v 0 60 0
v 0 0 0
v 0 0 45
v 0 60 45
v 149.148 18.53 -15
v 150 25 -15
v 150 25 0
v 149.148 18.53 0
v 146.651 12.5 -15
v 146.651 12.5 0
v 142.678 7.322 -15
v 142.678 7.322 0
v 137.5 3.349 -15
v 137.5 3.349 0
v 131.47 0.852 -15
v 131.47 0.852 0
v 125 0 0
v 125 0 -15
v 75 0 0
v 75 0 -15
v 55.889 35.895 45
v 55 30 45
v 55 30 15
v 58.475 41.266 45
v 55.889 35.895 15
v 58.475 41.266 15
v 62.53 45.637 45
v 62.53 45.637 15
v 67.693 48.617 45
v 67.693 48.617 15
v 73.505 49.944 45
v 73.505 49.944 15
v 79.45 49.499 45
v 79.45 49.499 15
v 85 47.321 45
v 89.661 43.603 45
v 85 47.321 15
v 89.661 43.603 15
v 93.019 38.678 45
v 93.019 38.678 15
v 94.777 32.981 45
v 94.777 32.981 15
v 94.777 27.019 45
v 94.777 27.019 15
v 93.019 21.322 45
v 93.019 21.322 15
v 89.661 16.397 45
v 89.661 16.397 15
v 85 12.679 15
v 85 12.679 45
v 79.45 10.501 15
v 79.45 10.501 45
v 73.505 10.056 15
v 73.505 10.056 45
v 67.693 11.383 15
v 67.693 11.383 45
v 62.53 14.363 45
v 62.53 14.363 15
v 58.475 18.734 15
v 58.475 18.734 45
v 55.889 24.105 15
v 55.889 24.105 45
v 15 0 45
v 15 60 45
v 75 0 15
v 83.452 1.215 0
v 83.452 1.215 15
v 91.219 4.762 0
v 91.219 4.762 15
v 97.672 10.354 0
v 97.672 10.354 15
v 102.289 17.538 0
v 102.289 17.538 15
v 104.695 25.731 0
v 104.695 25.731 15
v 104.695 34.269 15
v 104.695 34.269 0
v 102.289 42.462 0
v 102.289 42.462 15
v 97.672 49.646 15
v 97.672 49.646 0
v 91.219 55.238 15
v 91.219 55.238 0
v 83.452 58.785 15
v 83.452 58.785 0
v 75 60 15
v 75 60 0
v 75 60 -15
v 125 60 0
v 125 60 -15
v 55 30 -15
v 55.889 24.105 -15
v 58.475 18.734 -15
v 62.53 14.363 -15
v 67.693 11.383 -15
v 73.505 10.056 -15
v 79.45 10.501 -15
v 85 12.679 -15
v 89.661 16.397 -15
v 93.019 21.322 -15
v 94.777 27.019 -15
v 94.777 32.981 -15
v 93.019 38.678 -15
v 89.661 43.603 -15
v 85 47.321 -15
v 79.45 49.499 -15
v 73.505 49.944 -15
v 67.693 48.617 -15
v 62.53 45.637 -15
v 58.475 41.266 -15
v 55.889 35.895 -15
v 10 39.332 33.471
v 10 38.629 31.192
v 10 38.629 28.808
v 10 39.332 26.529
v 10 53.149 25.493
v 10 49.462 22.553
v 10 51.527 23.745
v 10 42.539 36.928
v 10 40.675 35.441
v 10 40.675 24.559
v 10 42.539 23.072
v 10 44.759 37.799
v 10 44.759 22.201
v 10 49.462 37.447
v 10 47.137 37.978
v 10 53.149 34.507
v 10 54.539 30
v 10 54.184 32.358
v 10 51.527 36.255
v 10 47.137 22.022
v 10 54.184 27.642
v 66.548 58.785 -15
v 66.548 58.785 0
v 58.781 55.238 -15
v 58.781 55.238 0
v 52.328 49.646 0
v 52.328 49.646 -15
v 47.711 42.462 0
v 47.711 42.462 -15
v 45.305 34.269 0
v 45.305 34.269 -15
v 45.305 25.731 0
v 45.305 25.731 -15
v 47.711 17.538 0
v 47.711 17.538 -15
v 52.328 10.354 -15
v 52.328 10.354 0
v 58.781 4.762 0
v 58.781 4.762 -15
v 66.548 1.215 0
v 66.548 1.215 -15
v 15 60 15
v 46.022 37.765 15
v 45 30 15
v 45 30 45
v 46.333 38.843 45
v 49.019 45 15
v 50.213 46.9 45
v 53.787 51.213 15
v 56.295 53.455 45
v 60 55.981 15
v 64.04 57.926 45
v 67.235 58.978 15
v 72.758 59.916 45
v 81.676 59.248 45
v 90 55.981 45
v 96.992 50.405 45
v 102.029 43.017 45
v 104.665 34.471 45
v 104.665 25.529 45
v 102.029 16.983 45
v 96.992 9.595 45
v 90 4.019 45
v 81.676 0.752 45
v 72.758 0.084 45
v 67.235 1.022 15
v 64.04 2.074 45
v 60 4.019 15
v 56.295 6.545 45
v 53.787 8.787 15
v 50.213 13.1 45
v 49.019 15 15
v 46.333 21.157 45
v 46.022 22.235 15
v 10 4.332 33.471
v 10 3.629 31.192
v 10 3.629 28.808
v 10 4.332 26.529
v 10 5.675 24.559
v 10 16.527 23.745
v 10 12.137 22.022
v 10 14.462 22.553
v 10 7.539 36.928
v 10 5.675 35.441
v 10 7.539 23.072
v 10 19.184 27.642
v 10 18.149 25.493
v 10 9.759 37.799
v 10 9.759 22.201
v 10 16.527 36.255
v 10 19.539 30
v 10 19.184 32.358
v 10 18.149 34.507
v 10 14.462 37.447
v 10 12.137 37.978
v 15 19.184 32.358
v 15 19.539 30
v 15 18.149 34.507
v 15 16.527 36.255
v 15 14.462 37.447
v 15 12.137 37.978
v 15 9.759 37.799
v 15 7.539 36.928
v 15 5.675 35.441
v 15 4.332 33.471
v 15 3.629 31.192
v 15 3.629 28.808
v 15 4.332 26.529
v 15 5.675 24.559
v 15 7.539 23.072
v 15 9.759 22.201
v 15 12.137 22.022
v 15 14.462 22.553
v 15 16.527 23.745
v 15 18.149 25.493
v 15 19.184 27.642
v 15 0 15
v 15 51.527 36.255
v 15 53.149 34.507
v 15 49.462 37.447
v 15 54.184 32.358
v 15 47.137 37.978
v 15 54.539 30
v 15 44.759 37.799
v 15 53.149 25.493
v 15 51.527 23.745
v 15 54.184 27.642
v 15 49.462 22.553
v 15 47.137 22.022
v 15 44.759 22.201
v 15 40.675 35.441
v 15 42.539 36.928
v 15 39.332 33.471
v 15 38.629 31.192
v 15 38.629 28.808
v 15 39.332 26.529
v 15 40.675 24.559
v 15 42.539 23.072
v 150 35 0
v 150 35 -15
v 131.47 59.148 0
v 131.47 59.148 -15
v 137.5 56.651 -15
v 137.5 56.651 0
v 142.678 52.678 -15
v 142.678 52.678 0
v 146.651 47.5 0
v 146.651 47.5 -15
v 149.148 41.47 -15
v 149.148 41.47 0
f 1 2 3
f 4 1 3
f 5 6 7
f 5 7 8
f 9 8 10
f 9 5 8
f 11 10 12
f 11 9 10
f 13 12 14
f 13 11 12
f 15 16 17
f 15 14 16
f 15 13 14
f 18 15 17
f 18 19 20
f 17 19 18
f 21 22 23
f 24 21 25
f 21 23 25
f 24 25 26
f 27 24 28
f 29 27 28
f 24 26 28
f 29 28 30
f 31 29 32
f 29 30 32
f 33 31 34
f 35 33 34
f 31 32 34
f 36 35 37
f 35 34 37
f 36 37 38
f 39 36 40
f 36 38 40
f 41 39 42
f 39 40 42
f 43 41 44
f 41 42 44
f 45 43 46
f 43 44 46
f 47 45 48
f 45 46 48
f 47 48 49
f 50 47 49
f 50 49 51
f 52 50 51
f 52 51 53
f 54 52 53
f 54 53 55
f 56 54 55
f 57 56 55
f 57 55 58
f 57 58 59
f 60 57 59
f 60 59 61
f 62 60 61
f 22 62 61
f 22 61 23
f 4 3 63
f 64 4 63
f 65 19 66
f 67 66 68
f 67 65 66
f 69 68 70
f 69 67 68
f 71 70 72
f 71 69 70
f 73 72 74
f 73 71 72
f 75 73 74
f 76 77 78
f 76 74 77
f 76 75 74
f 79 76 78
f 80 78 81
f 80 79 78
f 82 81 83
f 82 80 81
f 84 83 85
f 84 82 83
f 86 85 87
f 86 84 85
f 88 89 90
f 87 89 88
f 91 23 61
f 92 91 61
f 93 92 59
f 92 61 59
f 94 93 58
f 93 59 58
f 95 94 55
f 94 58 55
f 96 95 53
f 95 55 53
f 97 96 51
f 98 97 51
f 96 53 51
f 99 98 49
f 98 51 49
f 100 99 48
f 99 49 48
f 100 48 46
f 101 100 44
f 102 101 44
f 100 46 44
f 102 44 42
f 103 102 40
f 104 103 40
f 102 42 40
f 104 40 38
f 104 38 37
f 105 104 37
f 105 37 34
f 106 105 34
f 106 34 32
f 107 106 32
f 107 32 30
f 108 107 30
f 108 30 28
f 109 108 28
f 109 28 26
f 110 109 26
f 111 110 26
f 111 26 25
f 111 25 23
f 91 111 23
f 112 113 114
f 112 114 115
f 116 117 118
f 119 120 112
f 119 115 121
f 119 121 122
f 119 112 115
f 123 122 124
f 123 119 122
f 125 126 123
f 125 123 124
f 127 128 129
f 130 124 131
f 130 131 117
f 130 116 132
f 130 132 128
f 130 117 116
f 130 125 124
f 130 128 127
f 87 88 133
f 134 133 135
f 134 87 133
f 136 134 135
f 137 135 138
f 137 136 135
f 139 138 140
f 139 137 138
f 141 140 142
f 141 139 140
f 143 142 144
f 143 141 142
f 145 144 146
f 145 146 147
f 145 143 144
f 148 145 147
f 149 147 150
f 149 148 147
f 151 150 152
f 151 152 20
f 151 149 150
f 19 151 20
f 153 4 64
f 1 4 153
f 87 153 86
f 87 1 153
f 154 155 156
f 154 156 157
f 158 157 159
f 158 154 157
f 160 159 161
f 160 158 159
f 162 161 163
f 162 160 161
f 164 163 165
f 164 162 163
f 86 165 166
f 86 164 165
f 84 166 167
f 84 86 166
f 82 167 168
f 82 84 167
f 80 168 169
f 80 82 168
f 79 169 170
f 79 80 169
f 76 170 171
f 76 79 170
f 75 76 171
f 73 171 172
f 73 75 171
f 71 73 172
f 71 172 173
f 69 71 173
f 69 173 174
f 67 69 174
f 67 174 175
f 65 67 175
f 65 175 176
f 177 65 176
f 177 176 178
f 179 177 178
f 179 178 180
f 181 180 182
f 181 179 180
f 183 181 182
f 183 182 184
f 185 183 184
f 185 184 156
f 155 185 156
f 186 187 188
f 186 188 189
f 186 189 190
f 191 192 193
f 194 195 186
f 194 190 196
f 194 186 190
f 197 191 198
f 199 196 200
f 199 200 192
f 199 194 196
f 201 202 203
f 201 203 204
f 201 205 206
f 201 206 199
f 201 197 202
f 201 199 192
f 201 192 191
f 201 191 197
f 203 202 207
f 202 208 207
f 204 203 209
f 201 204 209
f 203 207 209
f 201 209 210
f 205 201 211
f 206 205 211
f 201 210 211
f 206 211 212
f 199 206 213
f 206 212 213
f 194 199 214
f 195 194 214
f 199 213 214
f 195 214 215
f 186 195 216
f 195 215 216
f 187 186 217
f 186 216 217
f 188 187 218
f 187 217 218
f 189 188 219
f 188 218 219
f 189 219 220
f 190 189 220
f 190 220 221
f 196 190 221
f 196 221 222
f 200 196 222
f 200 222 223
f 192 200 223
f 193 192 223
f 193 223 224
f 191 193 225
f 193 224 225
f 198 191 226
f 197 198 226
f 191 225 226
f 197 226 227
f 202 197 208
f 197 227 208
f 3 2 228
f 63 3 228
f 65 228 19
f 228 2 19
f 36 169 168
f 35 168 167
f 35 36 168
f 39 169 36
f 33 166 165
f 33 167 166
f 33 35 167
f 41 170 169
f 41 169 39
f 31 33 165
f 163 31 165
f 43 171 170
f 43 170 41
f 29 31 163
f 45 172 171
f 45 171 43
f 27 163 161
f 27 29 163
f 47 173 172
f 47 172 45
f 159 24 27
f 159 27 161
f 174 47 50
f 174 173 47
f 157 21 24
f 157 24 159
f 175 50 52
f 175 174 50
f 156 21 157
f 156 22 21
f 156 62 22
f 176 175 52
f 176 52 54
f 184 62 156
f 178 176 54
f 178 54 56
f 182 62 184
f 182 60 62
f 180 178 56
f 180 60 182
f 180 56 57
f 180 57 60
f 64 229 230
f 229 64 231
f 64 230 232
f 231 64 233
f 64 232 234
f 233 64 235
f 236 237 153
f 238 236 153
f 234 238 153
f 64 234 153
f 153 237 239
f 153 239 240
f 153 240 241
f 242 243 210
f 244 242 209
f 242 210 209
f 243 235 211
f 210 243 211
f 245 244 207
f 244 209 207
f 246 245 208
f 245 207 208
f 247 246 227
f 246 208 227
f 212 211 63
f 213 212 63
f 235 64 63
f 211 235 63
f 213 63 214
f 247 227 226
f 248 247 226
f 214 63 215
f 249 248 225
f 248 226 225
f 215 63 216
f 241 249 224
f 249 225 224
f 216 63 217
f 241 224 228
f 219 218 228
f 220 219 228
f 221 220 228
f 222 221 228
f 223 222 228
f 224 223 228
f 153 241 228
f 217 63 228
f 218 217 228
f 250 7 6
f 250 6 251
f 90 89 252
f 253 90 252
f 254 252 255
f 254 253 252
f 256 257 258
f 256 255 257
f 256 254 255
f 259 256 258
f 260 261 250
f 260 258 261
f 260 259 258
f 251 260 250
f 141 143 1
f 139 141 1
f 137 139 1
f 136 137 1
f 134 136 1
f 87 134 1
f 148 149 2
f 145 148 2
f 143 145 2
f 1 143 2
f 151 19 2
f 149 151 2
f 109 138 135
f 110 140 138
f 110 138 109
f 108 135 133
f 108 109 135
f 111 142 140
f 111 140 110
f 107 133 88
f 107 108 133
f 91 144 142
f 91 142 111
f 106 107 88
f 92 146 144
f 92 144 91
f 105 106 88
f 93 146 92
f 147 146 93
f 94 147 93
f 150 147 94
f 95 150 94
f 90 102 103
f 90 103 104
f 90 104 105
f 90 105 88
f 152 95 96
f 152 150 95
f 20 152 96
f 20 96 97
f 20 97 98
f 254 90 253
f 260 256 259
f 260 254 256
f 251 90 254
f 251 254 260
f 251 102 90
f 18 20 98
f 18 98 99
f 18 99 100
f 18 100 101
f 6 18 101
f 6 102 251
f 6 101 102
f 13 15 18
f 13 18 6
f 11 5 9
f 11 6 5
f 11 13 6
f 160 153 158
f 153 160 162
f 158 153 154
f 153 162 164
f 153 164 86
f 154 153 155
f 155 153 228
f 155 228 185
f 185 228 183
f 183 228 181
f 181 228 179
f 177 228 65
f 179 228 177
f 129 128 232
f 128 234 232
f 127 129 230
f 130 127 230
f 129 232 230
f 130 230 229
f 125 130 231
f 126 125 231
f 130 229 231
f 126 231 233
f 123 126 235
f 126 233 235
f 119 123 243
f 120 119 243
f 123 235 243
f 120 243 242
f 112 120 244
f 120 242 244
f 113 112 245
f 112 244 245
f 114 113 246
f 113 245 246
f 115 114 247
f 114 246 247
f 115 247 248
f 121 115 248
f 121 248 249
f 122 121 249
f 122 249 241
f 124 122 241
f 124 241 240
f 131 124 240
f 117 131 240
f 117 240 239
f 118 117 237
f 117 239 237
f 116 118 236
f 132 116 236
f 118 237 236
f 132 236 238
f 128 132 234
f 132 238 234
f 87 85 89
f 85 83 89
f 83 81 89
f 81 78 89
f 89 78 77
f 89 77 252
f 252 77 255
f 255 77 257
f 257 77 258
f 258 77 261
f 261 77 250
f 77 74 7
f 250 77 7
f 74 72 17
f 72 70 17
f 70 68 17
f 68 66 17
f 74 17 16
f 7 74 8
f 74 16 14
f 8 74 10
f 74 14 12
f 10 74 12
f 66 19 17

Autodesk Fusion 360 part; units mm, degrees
sketch "Sketch1" plane through (0, 0, 0) normal (0, 1, 0) x (1, 0, 0)
  line L0 (0, 0) -> (0, -45)
  line L1 (0, -45) -> (15, -45)
  line L2 (15, -45) -> (15, -15)
  line L3 (15, -15) -> (75, -15)
  line L4 (75, -15) -> (75, 0)
  line L5 (75, 0) -> (0, 0)
  dimension "d1" = 45
  dimension "d2" = 15
  dimension "d3" = 30
  dimension "d4" = 60
extrude "Extrude1" add sketch "Sketch1" along normal blind 60
sketch "Sketch2" plane through (15, 0, 0) normal (1, 0, 0) x (0, 1, 0)
  line L0 (0, 45) -> (0, 15)
  line L1 (0, 15) -> (60, 15)
  line L2 (60, 15) -> (60, 45)
  line L3 (60, 45) -> (0, 45)
  circle A0 centre (11.5393, 30) radius 8
  circle A1 centre (46.5393, 30) radius 8
  dimension "d7" = 15
  dimension "d8" = 15
  dimension "d9" = 35
  dimension "d10" = 16
  dimension "d11" = 16
extrude "Extrude2" cut sketch "Sketch2" against normal blind 5 contours A0 | A1
sketch "Sketch3" plane through (0, 0, 15) normal (0, 0, 1) x (-1, 0, 0)
  line L0 (-15, 0) -> (-75, 0)
  line L1 (-75, 0) -> (-75, -60)
  line L2 (-75, -60) -> (-15, -60)
  line L3 (-15, -60) -> (-15, 0)
  line L4 (0, 0) -> (0, -30) construction
  line L5 (0, -30) -> (-75, -30) construction
  circle A0 centre (-75, -30) radius 30
  circle A1 centre (-75, -30) radius 20
  dimension "d14" = 30
  dimension "d15" = 75
  dimension "d16" = 60
  dimension "d17" = 40
extrude "Extrude4" cut sketch "Sketch3" against normal blind 60 contours L1 A0 A1 | L1 A0 A1 | L1 A1 | L1 A1
extrude "Extrude5" add sketch "Sketch3" along normal blind 0 and the other way blind 15 contours L1 A0 A1 | L1 A0 A1
extrude "Extrude6" add sketch "Sketch3" against normal blind 15 from surface at -15 contours L1 A0 A1 | L1 A0 A1
extrude "Extrude7" add sketch "Sketch3" along normal blind 30 contours L1 A0 A1 | L1 A0 A1
sketch "Sketch4" plane through (0, 0, 0) normal (0, -1, 0) x (1, 0, 0)
  line L0 (0, 0) -> (75, 0)
  line L1 (75, 0) -> (75, 15)
  line L2 (75, 15) -> (15, 15)
  line L3 (15, 15) -> (15, 45)
  line L4 (15, 45) -> (0, 45)
  line L5 (0, 45) -> (0, 0)
sketch "Sketch5" plane through (0, 0, 45) normal (0, 0, 1) x (-1, 0, 0)
  circle A0 centre (-75, -30) radius 20
  circle A1 centre (-75, -30) radius 30
sketch "Sketch6" plane through (0, 0, 0) normal (-1, 0, 0) x (0, -1, 0)
  line L0 (0, 0) -> (0, 45)
  line L1 (0, 45) -> (-60, 45)
  line L2 (-60, 45) -> (-60, 0)
  line L3 (-60, 0) -> (0, 0)
sketch "Sketch7" plane through (0, 0, 0) normal (-1, 0, 0) x (0, -1, 0)
sketch "Sketch8" plane through (0, 0, 0) normal (0, -1, 0) x (1, 0, 0)
sketch "Sketch9" plane through (0, 0, 45) normal (0, 0, 1) x (-1, 0, 0)
sketch "Sketch10" plane through (0, 0, 0) normal (0, 0, -1) x (1, 0, 0)
  arc A0 (75, 0) -> (75, -60) centre (75, -30) ccw
  line L0 (75, 0) -> (0, 0)
  line L1 (0, 0) -> (0, -60)
  line L2 (0, -60) -> (75, -60)
  circle A1 centre (75, -30) radius 30
  circle A2 centre (75, -30) radius 20
  line L3 (75, 0) -> (150, 0)
  line L4 (150, 0) -> (150, -60)
  line L5 (150, -60) -> (75, -60)
extrude "Extrude8" add sketch "Sketch10" along normal blind 15 contours A1 L3 L4 L5
fillet "Fillet1" radius 25 2 edges at (150, 60, -7.5) (150, 0, -7.5)
sketch "Sketch11" plane through (0, 0, 45) normal (0, 0, 1) x (-1, 0, 0)
  line L0 (0, 0) -> (-15, 0)
  line L1 (-15, 0) -> (-15, -60)
  line L2 (-15, -60) -> (0, -60)
  line L3 (0, -60) -> (0, 0)
